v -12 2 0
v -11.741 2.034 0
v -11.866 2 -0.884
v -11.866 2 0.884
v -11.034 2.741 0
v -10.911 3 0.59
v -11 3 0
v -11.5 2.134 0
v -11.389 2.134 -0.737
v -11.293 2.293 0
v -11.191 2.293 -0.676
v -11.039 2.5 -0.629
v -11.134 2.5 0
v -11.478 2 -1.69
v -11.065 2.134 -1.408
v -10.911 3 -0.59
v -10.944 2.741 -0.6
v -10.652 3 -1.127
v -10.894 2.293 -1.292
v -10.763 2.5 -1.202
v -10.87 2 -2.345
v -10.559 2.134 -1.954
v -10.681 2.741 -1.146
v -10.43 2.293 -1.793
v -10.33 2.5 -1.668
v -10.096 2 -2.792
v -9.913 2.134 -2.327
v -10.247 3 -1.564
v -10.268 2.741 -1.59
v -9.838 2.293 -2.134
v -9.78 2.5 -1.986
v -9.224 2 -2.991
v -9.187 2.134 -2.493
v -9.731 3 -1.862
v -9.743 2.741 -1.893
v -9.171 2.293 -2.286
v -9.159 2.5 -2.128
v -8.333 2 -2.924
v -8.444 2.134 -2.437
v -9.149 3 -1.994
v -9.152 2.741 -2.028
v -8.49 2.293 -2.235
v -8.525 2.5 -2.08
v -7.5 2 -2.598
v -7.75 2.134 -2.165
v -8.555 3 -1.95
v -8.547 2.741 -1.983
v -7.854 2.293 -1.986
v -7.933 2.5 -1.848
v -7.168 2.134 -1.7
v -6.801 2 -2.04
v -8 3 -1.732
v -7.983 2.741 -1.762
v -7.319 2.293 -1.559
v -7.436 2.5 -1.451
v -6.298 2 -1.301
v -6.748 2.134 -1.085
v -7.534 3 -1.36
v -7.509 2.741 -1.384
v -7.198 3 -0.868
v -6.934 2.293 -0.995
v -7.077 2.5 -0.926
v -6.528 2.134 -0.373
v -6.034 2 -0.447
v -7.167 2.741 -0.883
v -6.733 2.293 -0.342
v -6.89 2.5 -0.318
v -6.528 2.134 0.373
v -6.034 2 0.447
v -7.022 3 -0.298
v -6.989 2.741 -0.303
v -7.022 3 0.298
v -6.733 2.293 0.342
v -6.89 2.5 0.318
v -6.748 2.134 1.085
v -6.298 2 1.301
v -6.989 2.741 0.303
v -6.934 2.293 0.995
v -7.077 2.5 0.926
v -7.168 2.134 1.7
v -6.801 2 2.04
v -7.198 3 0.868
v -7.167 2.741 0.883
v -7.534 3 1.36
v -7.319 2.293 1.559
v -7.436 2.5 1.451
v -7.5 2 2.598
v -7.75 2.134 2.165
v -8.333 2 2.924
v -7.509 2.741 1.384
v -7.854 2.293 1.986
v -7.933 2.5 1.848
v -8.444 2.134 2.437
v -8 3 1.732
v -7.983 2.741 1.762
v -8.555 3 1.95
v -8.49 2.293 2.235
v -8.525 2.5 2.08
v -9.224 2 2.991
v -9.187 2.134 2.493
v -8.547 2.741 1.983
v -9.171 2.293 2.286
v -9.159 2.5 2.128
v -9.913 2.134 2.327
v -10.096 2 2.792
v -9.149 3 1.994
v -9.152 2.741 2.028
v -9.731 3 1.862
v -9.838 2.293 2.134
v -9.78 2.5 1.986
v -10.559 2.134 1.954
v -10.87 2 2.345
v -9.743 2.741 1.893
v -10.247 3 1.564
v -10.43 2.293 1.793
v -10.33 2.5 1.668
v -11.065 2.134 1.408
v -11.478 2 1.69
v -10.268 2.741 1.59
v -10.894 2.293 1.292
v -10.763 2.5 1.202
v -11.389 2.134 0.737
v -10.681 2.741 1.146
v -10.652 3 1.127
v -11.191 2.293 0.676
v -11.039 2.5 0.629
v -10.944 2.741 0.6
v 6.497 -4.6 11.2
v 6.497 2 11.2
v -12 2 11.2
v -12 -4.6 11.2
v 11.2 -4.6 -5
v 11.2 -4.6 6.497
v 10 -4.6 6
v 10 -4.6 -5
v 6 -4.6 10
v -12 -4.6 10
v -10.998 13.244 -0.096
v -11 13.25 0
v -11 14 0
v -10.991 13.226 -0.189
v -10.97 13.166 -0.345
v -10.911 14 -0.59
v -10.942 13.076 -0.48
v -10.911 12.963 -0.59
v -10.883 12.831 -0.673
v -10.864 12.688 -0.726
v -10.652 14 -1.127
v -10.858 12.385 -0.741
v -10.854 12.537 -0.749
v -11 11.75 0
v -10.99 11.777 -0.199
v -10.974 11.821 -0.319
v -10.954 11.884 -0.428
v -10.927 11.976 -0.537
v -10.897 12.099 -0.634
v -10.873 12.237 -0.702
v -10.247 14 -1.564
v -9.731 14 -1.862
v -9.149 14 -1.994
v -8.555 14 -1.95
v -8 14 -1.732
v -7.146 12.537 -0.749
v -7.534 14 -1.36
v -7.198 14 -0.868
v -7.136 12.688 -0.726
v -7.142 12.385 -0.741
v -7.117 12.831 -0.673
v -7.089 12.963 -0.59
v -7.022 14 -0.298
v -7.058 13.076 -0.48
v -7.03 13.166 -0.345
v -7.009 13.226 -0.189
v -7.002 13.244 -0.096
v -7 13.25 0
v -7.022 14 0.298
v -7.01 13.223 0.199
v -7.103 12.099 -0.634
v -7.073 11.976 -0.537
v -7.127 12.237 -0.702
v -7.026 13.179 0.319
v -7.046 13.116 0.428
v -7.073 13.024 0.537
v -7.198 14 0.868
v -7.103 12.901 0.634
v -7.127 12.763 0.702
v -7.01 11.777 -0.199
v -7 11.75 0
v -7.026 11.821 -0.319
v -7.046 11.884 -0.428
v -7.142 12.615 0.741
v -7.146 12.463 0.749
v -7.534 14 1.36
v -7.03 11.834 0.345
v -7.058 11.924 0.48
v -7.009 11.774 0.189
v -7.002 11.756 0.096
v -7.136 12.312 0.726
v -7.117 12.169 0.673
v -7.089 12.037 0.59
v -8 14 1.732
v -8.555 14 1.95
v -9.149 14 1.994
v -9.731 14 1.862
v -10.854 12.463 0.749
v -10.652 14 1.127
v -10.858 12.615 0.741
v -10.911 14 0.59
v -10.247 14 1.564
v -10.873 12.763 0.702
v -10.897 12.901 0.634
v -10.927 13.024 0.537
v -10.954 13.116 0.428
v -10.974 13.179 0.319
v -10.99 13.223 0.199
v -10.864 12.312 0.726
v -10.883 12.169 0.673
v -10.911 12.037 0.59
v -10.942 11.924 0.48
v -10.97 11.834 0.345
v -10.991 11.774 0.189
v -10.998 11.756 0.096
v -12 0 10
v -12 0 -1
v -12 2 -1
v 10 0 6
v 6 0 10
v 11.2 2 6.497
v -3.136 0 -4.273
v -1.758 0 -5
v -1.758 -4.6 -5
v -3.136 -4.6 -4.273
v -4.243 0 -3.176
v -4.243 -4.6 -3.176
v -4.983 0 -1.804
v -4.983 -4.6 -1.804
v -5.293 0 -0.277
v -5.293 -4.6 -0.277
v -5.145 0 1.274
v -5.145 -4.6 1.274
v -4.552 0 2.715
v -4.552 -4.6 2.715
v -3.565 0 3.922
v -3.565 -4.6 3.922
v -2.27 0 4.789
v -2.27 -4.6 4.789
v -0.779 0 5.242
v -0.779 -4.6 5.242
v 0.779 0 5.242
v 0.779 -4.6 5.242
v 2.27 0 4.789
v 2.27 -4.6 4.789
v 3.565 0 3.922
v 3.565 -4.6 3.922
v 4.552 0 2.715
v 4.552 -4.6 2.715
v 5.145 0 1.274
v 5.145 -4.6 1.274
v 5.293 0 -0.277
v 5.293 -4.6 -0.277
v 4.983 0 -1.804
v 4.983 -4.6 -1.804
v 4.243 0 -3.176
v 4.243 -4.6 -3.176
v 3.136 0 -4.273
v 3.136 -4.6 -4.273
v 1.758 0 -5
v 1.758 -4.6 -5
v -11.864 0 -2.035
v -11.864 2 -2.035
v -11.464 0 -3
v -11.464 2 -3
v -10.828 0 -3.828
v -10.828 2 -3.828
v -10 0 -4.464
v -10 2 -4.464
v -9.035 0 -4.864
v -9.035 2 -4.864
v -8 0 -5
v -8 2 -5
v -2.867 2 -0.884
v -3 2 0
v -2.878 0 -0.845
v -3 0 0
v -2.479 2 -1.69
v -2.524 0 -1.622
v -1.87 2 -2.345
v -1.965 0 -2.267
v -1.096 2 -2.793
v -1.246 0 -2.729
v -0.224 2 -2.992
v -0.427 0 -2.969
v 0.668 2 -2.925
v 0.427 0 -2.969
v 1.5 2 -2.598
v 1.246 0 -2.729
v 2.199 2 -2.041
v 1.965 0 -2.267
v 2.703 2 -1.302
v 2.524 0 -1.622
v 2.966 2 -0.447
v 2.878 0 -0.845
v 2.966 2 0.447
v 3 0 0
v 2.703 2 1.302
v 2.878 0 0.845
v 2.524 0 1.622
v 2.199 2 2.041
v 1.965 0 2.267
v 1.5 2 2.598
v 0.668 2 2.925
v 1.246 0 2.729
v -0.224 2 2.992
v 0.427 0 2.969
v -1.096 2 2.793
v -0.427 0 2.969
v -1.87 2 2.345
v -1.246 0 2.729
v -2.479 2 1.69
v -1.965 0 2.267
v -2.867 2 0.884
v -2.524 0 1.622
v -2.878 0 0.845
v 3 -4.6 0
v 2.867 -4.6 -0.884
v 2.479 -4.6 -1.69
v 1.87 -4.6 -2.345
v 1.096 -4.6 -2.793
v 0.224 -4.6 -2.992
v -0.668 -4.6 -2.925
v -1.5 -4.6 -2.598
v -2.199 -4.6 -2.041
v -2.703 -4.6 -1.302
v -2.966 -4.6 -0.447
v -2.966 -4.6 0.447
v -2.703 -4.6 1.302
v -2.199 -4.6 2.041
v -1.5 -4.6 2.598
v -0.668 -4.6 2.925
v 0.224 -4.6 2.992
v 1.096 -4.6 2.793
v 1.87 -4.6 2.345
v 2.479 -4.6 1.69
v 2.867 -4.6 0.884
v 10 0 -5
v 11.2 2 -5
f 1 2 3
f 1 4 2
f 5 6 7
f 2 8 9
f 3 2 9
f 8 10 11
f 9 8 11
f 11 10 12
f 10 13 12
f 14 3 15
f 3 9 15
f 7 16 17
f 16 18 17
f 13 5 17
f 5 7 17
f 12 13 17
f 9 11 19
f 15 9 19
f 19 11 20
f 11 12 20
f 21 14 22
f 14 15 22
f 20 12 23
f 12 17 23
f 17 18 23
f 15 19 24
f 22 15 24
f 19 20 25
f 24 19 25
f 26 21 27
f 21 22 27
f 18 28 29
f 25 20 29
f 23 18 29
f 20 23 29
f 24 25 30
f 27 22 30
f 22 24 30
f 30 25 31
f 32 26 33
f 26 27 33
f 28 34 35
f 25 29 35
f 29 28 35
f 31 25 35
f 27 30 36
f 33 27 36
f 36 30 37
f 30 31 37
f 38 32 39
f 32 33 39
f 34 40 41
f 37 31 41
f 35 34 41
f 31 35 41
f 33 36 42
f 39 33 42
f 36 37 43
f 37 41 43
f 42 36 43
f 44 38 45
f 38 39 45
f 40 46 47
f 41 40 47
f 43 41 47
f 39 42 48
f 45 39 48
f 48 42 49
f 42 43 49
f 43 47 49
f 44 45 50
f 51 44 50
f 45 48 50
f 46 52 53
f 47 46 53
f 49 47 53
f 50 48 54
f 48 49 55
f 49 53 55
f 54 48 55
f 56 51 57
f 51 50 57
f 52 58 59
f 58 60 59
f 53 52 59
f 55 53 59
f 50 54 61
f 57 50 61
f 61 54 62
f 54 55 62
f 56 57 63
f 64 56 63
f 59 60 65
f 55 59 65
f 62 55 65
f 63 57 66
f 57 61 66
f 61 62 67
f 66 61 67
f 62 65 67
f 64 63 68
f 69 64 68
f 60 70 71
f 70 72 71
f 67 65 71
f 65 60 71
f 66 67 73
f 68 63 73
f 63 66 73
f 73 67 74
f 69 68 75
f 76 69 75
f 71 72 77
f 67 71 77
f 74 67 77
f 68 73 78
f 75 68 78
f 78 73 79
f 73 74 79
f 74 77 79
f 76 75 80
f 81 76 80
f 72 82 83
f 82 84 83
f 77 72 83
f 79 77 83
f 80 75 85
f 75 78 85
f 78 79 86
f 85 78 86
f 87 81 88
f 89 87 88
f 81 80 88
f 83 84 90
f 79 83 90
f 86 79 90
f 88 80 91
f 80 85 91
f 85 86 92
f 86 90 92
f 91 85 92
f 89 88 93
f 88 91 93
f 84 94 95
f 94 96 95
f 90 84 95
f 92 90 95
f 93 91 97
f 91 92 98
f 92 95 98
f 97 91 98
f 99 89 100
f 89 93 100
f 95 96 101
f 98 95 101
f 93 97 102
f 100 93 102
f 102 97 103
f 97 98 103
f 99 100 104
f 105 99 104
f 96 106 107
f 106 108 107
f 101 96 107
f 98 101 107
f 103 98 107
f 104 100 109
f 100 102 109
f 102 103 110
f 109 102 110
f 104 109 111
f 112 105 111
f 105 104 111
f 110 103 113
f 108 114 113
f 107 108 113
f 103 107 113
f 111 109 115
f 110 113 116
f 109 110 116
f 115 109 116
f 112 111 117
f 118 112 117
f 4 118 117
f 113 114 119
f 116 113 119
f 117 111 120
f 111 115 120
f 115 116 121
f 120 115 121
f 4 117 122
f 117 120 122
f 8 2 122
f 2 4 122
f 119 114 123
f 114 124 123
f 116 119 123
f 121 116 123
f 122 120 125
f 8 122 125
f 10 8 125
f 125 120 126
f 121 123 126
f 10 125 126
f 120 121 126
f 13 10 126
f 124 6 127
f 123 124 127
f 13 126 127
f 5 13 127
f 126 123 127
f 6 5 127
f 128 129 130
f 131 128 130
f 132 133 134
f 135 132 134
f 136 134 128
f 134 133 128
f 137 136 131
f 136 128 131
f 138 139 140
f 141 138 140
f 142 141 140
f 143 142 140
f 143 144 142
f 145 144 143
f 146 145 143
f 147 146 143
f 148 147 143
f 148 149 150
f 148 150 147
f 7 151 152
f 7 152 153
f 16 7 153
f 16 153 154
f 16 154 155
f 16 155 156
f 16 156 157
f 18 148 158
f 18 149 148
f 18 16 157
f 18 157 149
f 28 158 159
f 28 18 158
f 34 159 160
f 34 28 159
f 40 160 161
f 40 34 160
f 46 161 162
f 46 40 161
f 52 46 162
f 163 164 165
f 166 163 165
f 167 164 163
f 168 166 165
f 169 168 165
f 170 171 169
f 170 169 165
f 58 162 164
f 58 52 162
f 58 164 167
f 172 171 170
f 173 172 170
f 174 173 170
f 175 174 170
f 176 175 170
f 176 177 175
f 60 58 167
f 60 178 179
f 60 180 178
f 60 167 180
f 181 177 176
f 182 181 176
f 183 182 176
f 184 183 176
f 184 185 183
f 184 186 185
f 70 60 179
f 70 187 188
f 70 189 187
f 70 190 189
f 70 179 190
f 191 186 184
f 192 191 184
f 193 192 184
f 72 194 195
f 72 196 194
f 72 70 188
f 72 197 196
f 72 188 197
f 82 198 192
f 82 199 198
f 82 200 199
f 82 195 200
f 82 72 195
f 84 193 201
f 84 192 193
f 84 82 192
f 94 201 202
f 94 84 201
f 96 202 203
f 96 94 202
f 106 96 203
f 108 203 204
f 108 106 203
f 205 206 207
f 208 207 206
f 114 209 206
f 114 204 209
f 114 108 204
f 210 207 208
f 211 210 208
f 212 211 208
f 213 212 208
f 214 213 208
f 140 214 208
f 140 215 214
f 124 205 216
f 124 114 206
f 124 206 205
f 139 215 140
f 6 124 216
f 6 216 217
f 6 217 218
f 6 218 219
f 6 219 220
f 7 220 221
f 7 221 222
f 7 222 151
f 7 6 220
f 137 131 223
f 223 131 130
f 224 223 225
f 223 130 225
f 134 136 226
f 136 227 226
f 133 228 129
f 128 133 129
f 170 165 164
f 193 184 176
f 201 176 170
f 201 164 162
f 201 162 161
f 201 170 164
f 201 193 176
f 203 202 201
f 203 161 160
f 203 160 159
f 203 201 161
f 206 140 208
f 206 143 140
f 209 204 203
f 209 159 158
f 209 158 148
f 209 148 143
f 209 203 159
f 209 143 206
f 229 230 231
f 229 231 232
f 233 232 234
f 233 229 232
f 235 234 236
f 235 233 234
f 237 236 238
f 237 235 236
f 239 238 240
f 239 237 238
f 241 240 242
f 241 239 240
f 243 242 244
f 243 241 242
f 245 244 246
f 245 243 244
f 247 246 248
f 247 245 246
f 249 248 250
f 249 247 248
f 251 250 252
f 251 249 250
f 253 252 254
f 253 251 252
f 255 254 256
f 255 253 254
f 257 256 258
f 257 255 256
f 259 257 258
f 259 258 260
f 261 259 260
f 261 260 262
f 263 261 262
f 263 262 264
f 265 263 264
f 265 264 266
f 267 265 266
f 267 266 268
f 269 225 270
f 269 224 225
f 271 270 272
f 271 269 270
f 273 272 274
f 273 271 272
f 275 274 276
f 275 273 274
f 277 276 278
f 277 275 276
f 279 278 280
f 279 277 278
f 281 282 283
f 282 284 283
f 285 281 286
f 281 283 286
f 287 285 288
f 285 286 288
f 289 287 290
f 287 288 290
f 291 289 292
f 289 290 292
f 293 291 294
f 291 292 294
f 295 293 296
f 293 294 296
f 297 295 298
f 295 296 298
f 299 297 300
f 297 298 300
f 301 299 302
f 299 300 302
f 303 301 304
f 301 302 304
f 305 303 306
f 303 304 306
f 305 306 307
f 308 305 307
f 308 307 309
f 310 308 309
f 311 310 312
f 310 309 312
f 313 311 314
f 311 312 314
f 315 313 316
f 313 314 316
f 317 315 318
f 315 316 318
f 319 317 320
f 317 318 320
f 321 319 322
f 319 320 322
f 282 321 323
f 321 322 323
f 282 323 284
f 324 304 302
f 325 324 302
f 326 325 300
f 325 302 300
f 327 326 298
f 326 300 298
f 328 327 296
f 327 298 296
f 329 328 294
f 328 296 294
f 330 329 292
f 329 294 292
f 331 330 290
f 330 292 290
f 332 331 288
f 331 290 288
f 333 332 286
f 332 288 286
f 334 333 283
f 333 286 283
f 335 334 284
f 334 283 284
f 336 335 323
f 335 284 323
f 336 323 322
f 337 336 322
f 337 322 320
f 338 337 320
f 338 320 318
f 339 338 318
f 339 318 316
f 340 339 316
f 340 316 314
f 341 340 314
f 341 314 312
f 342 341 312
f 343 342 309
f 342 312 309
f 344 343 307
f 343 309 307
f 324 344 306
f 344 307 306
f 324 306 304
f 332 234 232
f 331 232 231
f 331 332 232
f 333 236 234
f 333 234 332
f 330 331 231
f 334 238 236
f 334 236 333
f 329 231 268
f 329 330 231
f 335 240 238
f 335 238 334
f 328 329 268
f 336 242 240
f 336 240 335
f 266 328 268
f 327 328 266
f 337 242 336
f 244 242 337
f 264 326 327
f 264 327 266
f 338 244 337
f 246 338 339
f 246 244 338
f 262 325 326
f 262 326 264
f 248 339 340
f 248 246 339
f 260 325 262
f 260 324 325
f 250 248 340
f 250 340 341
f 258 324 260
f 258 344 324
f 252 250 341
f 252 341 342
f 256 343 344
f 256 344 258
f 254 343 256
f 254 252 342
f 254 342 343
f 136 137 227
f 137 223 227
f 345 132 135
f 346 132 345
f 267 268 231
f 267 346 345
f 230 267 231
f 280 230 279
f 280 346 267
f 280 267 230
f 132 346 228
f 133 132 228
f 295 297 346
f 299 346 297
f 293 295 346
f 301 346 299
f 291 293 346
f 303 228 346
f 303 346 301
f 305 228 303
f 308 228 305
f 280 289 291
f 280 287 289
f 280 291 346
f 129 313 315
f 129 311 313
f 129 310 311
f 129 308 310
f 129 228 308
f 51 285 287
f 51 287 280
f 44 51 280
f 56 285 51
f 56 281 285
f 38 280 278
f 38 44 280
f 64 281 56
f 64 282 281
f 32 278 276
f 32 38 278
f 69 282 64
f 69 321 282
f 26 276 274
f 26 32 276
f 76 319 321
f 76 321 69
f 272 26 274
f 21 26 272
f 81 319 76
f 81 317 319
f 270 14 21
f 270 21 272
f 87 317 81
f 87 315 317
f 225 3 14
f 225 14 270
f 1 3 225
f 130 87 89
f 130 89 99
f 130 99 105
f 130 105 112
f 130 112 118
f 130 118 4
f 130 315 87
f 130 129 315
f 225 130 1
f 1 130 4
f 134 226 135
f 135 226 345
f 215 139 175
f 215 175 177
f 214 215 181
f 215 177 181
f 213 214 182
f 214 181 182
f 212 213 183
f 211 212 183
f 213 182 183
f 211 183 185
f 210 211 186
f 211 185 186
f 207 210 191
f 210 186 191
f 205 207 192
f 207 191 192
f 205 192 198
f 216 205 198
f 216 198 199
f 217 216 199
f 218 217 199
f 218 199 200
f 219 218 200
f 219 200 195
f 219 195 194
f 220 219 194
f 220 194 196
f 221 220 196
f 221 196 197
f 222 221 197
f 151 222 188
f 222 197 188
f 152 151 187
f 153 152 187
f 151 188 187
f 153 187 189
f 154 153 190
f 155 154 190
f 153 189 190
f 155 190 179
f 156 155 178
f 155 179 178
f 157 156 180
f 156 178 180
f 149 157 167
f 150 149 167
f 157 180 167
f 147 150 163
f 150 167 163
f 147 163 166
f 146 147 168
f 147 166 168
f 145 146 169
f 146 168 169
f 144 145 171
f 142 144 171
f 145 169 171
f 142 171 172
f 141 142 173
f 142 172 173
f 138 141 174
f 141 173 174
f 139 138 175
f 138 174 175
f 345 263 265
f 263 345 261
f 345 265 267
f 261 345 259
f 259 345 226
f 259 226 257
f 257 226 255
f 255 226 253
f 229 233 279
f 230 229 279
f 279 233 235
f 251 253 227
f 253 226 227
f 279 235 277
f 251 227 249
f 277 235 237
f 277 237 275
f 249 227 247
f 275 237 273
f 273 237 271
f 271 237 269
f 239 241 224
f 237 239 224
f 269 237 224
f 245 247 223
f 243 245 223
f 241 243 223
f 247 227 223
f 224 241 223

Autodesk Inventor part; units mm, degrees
ref_plane "YZ Plane" through (0, 0, 0) normal (1, 0, 0) x (0, 1, 0)
ref_plane "XZ Plane" through (0, 0, 0) normal (0, 1, 0) x (-1, 0, 0)
ref_plane "XY Plane" through (0, 0, 0) normal (0, 0, 1) x (1, 0, 0)
sketch "Sketch1" plane through (0, 0, 0) normal (0, 1, 0) x (-1, 0, 0)
  circle A0 centre (0, 0) radius 3
  line L0 (12, 10) -> (-6, 10)
  line L1 (-10, 6) -> (-10, -5)
  line L2 (12, 10) -> (12, -1)
  line L3 (-10, -5) -> (8, -5)
  arc A1 (8, -5) -> (12, -1) centre (8, -1) ccw
  line L4 (-6, 10) -> (-10, 6)
  line L5 (-6, 10) -> (-0.3431, 10) construction
  line L6 (-6.4971, 11.2) -> (12, 11.2)
  line L7 (12, 11.2) -> (12, 10)
  line L8 (-10, -5) -> (-11.2, -5)
  line L9 (-11.2, -5) -> (-11.2, 6.4971)
  line L10 (-11.2, 6.4971) -> (-6.4971, 11.2)
  line L11 (12, 10) -> (12, 10)
  line L12 (-10, -5) -> (-10, -5)
  circle A2 centre (9, 0) radius 2
  point P0 (7, 0)
  dimension "d0" = 6
  dimension "d1" = 10
  dimension "d2" = 10
  dimension "d3" = 5
  dimension "d4" = 7
  dimension "d5" = 5
  dimension "d6" = 135
  dimension "d7" = 4
  dimension "d8" = 1.2
  dimension "d9" = 1.2
  dimension "d14" = 4
  dimension "d20" = 2
extrude "Extrusion1" add sketch "Sketch1" along normal blind 2 contours L2 A1 L3 L1 L4 L0 | L0 L4 L1 L8 L9 L10 L6 L7 | A2
extrude "Extrusion2" add sketch "Sketch1" against normal blind 4.6 contours L0 L4 L1 L8 L9 L10 L6 L7
extrude "Extrusion3" add sketch "Sketch1" along normal blind 14 contours A2
sketch "Sketch4" plane through (0, 0, 0) normal (0, -1, 0) x (1, 0, 0)
  circle A0 centre (0, 0) radius 3 projected
  circle A1 centre (0, 0) radius 5.3
  circle A2 centre (0, 0) radius 3 projected
  line L0 (10, -5) -> (-8, -5) projected
  point P0 (-1.7578, -5)
  point P1 (1.7578, -5)
  dimension "d23" = 10.6
extrude "Extrusion5" add sketch "Sketch4" along normal blind 4.6 contours A1 L0 picked at (-0.1205, -4.326)
ref_plane "Work Plane1" through (-7, 0, 0) normal (1, 0, 0) x (0, 1, 0)
sketch "Sketch5" plane through (-7, 0, 0) normal (1, 0, 0) x (0, 1, 0)
  circle A0 centre (12.5, 0) radius 0.75
  line L0 (2, 6.4971) -> (2, -5) projected
  point P0 (0, 0)
  dimension "d24" = 1.5
  dimension "d25" = 10.5
extrude "Extrusion6" cut sketch "Sketch5" against normal through all
fillet "Fillet1" radius 1 1 edges at (-7, 2, 0)
equation "\"d4\" = -lensDistFromMetal + sensorDistFromLens - d1"
equation "\"d9\" = d8"
equation "\"sensorDistFromLens\" = 29"
equation "\"lensDistFromMetal\" = 12"
properties part number "stringHold"
